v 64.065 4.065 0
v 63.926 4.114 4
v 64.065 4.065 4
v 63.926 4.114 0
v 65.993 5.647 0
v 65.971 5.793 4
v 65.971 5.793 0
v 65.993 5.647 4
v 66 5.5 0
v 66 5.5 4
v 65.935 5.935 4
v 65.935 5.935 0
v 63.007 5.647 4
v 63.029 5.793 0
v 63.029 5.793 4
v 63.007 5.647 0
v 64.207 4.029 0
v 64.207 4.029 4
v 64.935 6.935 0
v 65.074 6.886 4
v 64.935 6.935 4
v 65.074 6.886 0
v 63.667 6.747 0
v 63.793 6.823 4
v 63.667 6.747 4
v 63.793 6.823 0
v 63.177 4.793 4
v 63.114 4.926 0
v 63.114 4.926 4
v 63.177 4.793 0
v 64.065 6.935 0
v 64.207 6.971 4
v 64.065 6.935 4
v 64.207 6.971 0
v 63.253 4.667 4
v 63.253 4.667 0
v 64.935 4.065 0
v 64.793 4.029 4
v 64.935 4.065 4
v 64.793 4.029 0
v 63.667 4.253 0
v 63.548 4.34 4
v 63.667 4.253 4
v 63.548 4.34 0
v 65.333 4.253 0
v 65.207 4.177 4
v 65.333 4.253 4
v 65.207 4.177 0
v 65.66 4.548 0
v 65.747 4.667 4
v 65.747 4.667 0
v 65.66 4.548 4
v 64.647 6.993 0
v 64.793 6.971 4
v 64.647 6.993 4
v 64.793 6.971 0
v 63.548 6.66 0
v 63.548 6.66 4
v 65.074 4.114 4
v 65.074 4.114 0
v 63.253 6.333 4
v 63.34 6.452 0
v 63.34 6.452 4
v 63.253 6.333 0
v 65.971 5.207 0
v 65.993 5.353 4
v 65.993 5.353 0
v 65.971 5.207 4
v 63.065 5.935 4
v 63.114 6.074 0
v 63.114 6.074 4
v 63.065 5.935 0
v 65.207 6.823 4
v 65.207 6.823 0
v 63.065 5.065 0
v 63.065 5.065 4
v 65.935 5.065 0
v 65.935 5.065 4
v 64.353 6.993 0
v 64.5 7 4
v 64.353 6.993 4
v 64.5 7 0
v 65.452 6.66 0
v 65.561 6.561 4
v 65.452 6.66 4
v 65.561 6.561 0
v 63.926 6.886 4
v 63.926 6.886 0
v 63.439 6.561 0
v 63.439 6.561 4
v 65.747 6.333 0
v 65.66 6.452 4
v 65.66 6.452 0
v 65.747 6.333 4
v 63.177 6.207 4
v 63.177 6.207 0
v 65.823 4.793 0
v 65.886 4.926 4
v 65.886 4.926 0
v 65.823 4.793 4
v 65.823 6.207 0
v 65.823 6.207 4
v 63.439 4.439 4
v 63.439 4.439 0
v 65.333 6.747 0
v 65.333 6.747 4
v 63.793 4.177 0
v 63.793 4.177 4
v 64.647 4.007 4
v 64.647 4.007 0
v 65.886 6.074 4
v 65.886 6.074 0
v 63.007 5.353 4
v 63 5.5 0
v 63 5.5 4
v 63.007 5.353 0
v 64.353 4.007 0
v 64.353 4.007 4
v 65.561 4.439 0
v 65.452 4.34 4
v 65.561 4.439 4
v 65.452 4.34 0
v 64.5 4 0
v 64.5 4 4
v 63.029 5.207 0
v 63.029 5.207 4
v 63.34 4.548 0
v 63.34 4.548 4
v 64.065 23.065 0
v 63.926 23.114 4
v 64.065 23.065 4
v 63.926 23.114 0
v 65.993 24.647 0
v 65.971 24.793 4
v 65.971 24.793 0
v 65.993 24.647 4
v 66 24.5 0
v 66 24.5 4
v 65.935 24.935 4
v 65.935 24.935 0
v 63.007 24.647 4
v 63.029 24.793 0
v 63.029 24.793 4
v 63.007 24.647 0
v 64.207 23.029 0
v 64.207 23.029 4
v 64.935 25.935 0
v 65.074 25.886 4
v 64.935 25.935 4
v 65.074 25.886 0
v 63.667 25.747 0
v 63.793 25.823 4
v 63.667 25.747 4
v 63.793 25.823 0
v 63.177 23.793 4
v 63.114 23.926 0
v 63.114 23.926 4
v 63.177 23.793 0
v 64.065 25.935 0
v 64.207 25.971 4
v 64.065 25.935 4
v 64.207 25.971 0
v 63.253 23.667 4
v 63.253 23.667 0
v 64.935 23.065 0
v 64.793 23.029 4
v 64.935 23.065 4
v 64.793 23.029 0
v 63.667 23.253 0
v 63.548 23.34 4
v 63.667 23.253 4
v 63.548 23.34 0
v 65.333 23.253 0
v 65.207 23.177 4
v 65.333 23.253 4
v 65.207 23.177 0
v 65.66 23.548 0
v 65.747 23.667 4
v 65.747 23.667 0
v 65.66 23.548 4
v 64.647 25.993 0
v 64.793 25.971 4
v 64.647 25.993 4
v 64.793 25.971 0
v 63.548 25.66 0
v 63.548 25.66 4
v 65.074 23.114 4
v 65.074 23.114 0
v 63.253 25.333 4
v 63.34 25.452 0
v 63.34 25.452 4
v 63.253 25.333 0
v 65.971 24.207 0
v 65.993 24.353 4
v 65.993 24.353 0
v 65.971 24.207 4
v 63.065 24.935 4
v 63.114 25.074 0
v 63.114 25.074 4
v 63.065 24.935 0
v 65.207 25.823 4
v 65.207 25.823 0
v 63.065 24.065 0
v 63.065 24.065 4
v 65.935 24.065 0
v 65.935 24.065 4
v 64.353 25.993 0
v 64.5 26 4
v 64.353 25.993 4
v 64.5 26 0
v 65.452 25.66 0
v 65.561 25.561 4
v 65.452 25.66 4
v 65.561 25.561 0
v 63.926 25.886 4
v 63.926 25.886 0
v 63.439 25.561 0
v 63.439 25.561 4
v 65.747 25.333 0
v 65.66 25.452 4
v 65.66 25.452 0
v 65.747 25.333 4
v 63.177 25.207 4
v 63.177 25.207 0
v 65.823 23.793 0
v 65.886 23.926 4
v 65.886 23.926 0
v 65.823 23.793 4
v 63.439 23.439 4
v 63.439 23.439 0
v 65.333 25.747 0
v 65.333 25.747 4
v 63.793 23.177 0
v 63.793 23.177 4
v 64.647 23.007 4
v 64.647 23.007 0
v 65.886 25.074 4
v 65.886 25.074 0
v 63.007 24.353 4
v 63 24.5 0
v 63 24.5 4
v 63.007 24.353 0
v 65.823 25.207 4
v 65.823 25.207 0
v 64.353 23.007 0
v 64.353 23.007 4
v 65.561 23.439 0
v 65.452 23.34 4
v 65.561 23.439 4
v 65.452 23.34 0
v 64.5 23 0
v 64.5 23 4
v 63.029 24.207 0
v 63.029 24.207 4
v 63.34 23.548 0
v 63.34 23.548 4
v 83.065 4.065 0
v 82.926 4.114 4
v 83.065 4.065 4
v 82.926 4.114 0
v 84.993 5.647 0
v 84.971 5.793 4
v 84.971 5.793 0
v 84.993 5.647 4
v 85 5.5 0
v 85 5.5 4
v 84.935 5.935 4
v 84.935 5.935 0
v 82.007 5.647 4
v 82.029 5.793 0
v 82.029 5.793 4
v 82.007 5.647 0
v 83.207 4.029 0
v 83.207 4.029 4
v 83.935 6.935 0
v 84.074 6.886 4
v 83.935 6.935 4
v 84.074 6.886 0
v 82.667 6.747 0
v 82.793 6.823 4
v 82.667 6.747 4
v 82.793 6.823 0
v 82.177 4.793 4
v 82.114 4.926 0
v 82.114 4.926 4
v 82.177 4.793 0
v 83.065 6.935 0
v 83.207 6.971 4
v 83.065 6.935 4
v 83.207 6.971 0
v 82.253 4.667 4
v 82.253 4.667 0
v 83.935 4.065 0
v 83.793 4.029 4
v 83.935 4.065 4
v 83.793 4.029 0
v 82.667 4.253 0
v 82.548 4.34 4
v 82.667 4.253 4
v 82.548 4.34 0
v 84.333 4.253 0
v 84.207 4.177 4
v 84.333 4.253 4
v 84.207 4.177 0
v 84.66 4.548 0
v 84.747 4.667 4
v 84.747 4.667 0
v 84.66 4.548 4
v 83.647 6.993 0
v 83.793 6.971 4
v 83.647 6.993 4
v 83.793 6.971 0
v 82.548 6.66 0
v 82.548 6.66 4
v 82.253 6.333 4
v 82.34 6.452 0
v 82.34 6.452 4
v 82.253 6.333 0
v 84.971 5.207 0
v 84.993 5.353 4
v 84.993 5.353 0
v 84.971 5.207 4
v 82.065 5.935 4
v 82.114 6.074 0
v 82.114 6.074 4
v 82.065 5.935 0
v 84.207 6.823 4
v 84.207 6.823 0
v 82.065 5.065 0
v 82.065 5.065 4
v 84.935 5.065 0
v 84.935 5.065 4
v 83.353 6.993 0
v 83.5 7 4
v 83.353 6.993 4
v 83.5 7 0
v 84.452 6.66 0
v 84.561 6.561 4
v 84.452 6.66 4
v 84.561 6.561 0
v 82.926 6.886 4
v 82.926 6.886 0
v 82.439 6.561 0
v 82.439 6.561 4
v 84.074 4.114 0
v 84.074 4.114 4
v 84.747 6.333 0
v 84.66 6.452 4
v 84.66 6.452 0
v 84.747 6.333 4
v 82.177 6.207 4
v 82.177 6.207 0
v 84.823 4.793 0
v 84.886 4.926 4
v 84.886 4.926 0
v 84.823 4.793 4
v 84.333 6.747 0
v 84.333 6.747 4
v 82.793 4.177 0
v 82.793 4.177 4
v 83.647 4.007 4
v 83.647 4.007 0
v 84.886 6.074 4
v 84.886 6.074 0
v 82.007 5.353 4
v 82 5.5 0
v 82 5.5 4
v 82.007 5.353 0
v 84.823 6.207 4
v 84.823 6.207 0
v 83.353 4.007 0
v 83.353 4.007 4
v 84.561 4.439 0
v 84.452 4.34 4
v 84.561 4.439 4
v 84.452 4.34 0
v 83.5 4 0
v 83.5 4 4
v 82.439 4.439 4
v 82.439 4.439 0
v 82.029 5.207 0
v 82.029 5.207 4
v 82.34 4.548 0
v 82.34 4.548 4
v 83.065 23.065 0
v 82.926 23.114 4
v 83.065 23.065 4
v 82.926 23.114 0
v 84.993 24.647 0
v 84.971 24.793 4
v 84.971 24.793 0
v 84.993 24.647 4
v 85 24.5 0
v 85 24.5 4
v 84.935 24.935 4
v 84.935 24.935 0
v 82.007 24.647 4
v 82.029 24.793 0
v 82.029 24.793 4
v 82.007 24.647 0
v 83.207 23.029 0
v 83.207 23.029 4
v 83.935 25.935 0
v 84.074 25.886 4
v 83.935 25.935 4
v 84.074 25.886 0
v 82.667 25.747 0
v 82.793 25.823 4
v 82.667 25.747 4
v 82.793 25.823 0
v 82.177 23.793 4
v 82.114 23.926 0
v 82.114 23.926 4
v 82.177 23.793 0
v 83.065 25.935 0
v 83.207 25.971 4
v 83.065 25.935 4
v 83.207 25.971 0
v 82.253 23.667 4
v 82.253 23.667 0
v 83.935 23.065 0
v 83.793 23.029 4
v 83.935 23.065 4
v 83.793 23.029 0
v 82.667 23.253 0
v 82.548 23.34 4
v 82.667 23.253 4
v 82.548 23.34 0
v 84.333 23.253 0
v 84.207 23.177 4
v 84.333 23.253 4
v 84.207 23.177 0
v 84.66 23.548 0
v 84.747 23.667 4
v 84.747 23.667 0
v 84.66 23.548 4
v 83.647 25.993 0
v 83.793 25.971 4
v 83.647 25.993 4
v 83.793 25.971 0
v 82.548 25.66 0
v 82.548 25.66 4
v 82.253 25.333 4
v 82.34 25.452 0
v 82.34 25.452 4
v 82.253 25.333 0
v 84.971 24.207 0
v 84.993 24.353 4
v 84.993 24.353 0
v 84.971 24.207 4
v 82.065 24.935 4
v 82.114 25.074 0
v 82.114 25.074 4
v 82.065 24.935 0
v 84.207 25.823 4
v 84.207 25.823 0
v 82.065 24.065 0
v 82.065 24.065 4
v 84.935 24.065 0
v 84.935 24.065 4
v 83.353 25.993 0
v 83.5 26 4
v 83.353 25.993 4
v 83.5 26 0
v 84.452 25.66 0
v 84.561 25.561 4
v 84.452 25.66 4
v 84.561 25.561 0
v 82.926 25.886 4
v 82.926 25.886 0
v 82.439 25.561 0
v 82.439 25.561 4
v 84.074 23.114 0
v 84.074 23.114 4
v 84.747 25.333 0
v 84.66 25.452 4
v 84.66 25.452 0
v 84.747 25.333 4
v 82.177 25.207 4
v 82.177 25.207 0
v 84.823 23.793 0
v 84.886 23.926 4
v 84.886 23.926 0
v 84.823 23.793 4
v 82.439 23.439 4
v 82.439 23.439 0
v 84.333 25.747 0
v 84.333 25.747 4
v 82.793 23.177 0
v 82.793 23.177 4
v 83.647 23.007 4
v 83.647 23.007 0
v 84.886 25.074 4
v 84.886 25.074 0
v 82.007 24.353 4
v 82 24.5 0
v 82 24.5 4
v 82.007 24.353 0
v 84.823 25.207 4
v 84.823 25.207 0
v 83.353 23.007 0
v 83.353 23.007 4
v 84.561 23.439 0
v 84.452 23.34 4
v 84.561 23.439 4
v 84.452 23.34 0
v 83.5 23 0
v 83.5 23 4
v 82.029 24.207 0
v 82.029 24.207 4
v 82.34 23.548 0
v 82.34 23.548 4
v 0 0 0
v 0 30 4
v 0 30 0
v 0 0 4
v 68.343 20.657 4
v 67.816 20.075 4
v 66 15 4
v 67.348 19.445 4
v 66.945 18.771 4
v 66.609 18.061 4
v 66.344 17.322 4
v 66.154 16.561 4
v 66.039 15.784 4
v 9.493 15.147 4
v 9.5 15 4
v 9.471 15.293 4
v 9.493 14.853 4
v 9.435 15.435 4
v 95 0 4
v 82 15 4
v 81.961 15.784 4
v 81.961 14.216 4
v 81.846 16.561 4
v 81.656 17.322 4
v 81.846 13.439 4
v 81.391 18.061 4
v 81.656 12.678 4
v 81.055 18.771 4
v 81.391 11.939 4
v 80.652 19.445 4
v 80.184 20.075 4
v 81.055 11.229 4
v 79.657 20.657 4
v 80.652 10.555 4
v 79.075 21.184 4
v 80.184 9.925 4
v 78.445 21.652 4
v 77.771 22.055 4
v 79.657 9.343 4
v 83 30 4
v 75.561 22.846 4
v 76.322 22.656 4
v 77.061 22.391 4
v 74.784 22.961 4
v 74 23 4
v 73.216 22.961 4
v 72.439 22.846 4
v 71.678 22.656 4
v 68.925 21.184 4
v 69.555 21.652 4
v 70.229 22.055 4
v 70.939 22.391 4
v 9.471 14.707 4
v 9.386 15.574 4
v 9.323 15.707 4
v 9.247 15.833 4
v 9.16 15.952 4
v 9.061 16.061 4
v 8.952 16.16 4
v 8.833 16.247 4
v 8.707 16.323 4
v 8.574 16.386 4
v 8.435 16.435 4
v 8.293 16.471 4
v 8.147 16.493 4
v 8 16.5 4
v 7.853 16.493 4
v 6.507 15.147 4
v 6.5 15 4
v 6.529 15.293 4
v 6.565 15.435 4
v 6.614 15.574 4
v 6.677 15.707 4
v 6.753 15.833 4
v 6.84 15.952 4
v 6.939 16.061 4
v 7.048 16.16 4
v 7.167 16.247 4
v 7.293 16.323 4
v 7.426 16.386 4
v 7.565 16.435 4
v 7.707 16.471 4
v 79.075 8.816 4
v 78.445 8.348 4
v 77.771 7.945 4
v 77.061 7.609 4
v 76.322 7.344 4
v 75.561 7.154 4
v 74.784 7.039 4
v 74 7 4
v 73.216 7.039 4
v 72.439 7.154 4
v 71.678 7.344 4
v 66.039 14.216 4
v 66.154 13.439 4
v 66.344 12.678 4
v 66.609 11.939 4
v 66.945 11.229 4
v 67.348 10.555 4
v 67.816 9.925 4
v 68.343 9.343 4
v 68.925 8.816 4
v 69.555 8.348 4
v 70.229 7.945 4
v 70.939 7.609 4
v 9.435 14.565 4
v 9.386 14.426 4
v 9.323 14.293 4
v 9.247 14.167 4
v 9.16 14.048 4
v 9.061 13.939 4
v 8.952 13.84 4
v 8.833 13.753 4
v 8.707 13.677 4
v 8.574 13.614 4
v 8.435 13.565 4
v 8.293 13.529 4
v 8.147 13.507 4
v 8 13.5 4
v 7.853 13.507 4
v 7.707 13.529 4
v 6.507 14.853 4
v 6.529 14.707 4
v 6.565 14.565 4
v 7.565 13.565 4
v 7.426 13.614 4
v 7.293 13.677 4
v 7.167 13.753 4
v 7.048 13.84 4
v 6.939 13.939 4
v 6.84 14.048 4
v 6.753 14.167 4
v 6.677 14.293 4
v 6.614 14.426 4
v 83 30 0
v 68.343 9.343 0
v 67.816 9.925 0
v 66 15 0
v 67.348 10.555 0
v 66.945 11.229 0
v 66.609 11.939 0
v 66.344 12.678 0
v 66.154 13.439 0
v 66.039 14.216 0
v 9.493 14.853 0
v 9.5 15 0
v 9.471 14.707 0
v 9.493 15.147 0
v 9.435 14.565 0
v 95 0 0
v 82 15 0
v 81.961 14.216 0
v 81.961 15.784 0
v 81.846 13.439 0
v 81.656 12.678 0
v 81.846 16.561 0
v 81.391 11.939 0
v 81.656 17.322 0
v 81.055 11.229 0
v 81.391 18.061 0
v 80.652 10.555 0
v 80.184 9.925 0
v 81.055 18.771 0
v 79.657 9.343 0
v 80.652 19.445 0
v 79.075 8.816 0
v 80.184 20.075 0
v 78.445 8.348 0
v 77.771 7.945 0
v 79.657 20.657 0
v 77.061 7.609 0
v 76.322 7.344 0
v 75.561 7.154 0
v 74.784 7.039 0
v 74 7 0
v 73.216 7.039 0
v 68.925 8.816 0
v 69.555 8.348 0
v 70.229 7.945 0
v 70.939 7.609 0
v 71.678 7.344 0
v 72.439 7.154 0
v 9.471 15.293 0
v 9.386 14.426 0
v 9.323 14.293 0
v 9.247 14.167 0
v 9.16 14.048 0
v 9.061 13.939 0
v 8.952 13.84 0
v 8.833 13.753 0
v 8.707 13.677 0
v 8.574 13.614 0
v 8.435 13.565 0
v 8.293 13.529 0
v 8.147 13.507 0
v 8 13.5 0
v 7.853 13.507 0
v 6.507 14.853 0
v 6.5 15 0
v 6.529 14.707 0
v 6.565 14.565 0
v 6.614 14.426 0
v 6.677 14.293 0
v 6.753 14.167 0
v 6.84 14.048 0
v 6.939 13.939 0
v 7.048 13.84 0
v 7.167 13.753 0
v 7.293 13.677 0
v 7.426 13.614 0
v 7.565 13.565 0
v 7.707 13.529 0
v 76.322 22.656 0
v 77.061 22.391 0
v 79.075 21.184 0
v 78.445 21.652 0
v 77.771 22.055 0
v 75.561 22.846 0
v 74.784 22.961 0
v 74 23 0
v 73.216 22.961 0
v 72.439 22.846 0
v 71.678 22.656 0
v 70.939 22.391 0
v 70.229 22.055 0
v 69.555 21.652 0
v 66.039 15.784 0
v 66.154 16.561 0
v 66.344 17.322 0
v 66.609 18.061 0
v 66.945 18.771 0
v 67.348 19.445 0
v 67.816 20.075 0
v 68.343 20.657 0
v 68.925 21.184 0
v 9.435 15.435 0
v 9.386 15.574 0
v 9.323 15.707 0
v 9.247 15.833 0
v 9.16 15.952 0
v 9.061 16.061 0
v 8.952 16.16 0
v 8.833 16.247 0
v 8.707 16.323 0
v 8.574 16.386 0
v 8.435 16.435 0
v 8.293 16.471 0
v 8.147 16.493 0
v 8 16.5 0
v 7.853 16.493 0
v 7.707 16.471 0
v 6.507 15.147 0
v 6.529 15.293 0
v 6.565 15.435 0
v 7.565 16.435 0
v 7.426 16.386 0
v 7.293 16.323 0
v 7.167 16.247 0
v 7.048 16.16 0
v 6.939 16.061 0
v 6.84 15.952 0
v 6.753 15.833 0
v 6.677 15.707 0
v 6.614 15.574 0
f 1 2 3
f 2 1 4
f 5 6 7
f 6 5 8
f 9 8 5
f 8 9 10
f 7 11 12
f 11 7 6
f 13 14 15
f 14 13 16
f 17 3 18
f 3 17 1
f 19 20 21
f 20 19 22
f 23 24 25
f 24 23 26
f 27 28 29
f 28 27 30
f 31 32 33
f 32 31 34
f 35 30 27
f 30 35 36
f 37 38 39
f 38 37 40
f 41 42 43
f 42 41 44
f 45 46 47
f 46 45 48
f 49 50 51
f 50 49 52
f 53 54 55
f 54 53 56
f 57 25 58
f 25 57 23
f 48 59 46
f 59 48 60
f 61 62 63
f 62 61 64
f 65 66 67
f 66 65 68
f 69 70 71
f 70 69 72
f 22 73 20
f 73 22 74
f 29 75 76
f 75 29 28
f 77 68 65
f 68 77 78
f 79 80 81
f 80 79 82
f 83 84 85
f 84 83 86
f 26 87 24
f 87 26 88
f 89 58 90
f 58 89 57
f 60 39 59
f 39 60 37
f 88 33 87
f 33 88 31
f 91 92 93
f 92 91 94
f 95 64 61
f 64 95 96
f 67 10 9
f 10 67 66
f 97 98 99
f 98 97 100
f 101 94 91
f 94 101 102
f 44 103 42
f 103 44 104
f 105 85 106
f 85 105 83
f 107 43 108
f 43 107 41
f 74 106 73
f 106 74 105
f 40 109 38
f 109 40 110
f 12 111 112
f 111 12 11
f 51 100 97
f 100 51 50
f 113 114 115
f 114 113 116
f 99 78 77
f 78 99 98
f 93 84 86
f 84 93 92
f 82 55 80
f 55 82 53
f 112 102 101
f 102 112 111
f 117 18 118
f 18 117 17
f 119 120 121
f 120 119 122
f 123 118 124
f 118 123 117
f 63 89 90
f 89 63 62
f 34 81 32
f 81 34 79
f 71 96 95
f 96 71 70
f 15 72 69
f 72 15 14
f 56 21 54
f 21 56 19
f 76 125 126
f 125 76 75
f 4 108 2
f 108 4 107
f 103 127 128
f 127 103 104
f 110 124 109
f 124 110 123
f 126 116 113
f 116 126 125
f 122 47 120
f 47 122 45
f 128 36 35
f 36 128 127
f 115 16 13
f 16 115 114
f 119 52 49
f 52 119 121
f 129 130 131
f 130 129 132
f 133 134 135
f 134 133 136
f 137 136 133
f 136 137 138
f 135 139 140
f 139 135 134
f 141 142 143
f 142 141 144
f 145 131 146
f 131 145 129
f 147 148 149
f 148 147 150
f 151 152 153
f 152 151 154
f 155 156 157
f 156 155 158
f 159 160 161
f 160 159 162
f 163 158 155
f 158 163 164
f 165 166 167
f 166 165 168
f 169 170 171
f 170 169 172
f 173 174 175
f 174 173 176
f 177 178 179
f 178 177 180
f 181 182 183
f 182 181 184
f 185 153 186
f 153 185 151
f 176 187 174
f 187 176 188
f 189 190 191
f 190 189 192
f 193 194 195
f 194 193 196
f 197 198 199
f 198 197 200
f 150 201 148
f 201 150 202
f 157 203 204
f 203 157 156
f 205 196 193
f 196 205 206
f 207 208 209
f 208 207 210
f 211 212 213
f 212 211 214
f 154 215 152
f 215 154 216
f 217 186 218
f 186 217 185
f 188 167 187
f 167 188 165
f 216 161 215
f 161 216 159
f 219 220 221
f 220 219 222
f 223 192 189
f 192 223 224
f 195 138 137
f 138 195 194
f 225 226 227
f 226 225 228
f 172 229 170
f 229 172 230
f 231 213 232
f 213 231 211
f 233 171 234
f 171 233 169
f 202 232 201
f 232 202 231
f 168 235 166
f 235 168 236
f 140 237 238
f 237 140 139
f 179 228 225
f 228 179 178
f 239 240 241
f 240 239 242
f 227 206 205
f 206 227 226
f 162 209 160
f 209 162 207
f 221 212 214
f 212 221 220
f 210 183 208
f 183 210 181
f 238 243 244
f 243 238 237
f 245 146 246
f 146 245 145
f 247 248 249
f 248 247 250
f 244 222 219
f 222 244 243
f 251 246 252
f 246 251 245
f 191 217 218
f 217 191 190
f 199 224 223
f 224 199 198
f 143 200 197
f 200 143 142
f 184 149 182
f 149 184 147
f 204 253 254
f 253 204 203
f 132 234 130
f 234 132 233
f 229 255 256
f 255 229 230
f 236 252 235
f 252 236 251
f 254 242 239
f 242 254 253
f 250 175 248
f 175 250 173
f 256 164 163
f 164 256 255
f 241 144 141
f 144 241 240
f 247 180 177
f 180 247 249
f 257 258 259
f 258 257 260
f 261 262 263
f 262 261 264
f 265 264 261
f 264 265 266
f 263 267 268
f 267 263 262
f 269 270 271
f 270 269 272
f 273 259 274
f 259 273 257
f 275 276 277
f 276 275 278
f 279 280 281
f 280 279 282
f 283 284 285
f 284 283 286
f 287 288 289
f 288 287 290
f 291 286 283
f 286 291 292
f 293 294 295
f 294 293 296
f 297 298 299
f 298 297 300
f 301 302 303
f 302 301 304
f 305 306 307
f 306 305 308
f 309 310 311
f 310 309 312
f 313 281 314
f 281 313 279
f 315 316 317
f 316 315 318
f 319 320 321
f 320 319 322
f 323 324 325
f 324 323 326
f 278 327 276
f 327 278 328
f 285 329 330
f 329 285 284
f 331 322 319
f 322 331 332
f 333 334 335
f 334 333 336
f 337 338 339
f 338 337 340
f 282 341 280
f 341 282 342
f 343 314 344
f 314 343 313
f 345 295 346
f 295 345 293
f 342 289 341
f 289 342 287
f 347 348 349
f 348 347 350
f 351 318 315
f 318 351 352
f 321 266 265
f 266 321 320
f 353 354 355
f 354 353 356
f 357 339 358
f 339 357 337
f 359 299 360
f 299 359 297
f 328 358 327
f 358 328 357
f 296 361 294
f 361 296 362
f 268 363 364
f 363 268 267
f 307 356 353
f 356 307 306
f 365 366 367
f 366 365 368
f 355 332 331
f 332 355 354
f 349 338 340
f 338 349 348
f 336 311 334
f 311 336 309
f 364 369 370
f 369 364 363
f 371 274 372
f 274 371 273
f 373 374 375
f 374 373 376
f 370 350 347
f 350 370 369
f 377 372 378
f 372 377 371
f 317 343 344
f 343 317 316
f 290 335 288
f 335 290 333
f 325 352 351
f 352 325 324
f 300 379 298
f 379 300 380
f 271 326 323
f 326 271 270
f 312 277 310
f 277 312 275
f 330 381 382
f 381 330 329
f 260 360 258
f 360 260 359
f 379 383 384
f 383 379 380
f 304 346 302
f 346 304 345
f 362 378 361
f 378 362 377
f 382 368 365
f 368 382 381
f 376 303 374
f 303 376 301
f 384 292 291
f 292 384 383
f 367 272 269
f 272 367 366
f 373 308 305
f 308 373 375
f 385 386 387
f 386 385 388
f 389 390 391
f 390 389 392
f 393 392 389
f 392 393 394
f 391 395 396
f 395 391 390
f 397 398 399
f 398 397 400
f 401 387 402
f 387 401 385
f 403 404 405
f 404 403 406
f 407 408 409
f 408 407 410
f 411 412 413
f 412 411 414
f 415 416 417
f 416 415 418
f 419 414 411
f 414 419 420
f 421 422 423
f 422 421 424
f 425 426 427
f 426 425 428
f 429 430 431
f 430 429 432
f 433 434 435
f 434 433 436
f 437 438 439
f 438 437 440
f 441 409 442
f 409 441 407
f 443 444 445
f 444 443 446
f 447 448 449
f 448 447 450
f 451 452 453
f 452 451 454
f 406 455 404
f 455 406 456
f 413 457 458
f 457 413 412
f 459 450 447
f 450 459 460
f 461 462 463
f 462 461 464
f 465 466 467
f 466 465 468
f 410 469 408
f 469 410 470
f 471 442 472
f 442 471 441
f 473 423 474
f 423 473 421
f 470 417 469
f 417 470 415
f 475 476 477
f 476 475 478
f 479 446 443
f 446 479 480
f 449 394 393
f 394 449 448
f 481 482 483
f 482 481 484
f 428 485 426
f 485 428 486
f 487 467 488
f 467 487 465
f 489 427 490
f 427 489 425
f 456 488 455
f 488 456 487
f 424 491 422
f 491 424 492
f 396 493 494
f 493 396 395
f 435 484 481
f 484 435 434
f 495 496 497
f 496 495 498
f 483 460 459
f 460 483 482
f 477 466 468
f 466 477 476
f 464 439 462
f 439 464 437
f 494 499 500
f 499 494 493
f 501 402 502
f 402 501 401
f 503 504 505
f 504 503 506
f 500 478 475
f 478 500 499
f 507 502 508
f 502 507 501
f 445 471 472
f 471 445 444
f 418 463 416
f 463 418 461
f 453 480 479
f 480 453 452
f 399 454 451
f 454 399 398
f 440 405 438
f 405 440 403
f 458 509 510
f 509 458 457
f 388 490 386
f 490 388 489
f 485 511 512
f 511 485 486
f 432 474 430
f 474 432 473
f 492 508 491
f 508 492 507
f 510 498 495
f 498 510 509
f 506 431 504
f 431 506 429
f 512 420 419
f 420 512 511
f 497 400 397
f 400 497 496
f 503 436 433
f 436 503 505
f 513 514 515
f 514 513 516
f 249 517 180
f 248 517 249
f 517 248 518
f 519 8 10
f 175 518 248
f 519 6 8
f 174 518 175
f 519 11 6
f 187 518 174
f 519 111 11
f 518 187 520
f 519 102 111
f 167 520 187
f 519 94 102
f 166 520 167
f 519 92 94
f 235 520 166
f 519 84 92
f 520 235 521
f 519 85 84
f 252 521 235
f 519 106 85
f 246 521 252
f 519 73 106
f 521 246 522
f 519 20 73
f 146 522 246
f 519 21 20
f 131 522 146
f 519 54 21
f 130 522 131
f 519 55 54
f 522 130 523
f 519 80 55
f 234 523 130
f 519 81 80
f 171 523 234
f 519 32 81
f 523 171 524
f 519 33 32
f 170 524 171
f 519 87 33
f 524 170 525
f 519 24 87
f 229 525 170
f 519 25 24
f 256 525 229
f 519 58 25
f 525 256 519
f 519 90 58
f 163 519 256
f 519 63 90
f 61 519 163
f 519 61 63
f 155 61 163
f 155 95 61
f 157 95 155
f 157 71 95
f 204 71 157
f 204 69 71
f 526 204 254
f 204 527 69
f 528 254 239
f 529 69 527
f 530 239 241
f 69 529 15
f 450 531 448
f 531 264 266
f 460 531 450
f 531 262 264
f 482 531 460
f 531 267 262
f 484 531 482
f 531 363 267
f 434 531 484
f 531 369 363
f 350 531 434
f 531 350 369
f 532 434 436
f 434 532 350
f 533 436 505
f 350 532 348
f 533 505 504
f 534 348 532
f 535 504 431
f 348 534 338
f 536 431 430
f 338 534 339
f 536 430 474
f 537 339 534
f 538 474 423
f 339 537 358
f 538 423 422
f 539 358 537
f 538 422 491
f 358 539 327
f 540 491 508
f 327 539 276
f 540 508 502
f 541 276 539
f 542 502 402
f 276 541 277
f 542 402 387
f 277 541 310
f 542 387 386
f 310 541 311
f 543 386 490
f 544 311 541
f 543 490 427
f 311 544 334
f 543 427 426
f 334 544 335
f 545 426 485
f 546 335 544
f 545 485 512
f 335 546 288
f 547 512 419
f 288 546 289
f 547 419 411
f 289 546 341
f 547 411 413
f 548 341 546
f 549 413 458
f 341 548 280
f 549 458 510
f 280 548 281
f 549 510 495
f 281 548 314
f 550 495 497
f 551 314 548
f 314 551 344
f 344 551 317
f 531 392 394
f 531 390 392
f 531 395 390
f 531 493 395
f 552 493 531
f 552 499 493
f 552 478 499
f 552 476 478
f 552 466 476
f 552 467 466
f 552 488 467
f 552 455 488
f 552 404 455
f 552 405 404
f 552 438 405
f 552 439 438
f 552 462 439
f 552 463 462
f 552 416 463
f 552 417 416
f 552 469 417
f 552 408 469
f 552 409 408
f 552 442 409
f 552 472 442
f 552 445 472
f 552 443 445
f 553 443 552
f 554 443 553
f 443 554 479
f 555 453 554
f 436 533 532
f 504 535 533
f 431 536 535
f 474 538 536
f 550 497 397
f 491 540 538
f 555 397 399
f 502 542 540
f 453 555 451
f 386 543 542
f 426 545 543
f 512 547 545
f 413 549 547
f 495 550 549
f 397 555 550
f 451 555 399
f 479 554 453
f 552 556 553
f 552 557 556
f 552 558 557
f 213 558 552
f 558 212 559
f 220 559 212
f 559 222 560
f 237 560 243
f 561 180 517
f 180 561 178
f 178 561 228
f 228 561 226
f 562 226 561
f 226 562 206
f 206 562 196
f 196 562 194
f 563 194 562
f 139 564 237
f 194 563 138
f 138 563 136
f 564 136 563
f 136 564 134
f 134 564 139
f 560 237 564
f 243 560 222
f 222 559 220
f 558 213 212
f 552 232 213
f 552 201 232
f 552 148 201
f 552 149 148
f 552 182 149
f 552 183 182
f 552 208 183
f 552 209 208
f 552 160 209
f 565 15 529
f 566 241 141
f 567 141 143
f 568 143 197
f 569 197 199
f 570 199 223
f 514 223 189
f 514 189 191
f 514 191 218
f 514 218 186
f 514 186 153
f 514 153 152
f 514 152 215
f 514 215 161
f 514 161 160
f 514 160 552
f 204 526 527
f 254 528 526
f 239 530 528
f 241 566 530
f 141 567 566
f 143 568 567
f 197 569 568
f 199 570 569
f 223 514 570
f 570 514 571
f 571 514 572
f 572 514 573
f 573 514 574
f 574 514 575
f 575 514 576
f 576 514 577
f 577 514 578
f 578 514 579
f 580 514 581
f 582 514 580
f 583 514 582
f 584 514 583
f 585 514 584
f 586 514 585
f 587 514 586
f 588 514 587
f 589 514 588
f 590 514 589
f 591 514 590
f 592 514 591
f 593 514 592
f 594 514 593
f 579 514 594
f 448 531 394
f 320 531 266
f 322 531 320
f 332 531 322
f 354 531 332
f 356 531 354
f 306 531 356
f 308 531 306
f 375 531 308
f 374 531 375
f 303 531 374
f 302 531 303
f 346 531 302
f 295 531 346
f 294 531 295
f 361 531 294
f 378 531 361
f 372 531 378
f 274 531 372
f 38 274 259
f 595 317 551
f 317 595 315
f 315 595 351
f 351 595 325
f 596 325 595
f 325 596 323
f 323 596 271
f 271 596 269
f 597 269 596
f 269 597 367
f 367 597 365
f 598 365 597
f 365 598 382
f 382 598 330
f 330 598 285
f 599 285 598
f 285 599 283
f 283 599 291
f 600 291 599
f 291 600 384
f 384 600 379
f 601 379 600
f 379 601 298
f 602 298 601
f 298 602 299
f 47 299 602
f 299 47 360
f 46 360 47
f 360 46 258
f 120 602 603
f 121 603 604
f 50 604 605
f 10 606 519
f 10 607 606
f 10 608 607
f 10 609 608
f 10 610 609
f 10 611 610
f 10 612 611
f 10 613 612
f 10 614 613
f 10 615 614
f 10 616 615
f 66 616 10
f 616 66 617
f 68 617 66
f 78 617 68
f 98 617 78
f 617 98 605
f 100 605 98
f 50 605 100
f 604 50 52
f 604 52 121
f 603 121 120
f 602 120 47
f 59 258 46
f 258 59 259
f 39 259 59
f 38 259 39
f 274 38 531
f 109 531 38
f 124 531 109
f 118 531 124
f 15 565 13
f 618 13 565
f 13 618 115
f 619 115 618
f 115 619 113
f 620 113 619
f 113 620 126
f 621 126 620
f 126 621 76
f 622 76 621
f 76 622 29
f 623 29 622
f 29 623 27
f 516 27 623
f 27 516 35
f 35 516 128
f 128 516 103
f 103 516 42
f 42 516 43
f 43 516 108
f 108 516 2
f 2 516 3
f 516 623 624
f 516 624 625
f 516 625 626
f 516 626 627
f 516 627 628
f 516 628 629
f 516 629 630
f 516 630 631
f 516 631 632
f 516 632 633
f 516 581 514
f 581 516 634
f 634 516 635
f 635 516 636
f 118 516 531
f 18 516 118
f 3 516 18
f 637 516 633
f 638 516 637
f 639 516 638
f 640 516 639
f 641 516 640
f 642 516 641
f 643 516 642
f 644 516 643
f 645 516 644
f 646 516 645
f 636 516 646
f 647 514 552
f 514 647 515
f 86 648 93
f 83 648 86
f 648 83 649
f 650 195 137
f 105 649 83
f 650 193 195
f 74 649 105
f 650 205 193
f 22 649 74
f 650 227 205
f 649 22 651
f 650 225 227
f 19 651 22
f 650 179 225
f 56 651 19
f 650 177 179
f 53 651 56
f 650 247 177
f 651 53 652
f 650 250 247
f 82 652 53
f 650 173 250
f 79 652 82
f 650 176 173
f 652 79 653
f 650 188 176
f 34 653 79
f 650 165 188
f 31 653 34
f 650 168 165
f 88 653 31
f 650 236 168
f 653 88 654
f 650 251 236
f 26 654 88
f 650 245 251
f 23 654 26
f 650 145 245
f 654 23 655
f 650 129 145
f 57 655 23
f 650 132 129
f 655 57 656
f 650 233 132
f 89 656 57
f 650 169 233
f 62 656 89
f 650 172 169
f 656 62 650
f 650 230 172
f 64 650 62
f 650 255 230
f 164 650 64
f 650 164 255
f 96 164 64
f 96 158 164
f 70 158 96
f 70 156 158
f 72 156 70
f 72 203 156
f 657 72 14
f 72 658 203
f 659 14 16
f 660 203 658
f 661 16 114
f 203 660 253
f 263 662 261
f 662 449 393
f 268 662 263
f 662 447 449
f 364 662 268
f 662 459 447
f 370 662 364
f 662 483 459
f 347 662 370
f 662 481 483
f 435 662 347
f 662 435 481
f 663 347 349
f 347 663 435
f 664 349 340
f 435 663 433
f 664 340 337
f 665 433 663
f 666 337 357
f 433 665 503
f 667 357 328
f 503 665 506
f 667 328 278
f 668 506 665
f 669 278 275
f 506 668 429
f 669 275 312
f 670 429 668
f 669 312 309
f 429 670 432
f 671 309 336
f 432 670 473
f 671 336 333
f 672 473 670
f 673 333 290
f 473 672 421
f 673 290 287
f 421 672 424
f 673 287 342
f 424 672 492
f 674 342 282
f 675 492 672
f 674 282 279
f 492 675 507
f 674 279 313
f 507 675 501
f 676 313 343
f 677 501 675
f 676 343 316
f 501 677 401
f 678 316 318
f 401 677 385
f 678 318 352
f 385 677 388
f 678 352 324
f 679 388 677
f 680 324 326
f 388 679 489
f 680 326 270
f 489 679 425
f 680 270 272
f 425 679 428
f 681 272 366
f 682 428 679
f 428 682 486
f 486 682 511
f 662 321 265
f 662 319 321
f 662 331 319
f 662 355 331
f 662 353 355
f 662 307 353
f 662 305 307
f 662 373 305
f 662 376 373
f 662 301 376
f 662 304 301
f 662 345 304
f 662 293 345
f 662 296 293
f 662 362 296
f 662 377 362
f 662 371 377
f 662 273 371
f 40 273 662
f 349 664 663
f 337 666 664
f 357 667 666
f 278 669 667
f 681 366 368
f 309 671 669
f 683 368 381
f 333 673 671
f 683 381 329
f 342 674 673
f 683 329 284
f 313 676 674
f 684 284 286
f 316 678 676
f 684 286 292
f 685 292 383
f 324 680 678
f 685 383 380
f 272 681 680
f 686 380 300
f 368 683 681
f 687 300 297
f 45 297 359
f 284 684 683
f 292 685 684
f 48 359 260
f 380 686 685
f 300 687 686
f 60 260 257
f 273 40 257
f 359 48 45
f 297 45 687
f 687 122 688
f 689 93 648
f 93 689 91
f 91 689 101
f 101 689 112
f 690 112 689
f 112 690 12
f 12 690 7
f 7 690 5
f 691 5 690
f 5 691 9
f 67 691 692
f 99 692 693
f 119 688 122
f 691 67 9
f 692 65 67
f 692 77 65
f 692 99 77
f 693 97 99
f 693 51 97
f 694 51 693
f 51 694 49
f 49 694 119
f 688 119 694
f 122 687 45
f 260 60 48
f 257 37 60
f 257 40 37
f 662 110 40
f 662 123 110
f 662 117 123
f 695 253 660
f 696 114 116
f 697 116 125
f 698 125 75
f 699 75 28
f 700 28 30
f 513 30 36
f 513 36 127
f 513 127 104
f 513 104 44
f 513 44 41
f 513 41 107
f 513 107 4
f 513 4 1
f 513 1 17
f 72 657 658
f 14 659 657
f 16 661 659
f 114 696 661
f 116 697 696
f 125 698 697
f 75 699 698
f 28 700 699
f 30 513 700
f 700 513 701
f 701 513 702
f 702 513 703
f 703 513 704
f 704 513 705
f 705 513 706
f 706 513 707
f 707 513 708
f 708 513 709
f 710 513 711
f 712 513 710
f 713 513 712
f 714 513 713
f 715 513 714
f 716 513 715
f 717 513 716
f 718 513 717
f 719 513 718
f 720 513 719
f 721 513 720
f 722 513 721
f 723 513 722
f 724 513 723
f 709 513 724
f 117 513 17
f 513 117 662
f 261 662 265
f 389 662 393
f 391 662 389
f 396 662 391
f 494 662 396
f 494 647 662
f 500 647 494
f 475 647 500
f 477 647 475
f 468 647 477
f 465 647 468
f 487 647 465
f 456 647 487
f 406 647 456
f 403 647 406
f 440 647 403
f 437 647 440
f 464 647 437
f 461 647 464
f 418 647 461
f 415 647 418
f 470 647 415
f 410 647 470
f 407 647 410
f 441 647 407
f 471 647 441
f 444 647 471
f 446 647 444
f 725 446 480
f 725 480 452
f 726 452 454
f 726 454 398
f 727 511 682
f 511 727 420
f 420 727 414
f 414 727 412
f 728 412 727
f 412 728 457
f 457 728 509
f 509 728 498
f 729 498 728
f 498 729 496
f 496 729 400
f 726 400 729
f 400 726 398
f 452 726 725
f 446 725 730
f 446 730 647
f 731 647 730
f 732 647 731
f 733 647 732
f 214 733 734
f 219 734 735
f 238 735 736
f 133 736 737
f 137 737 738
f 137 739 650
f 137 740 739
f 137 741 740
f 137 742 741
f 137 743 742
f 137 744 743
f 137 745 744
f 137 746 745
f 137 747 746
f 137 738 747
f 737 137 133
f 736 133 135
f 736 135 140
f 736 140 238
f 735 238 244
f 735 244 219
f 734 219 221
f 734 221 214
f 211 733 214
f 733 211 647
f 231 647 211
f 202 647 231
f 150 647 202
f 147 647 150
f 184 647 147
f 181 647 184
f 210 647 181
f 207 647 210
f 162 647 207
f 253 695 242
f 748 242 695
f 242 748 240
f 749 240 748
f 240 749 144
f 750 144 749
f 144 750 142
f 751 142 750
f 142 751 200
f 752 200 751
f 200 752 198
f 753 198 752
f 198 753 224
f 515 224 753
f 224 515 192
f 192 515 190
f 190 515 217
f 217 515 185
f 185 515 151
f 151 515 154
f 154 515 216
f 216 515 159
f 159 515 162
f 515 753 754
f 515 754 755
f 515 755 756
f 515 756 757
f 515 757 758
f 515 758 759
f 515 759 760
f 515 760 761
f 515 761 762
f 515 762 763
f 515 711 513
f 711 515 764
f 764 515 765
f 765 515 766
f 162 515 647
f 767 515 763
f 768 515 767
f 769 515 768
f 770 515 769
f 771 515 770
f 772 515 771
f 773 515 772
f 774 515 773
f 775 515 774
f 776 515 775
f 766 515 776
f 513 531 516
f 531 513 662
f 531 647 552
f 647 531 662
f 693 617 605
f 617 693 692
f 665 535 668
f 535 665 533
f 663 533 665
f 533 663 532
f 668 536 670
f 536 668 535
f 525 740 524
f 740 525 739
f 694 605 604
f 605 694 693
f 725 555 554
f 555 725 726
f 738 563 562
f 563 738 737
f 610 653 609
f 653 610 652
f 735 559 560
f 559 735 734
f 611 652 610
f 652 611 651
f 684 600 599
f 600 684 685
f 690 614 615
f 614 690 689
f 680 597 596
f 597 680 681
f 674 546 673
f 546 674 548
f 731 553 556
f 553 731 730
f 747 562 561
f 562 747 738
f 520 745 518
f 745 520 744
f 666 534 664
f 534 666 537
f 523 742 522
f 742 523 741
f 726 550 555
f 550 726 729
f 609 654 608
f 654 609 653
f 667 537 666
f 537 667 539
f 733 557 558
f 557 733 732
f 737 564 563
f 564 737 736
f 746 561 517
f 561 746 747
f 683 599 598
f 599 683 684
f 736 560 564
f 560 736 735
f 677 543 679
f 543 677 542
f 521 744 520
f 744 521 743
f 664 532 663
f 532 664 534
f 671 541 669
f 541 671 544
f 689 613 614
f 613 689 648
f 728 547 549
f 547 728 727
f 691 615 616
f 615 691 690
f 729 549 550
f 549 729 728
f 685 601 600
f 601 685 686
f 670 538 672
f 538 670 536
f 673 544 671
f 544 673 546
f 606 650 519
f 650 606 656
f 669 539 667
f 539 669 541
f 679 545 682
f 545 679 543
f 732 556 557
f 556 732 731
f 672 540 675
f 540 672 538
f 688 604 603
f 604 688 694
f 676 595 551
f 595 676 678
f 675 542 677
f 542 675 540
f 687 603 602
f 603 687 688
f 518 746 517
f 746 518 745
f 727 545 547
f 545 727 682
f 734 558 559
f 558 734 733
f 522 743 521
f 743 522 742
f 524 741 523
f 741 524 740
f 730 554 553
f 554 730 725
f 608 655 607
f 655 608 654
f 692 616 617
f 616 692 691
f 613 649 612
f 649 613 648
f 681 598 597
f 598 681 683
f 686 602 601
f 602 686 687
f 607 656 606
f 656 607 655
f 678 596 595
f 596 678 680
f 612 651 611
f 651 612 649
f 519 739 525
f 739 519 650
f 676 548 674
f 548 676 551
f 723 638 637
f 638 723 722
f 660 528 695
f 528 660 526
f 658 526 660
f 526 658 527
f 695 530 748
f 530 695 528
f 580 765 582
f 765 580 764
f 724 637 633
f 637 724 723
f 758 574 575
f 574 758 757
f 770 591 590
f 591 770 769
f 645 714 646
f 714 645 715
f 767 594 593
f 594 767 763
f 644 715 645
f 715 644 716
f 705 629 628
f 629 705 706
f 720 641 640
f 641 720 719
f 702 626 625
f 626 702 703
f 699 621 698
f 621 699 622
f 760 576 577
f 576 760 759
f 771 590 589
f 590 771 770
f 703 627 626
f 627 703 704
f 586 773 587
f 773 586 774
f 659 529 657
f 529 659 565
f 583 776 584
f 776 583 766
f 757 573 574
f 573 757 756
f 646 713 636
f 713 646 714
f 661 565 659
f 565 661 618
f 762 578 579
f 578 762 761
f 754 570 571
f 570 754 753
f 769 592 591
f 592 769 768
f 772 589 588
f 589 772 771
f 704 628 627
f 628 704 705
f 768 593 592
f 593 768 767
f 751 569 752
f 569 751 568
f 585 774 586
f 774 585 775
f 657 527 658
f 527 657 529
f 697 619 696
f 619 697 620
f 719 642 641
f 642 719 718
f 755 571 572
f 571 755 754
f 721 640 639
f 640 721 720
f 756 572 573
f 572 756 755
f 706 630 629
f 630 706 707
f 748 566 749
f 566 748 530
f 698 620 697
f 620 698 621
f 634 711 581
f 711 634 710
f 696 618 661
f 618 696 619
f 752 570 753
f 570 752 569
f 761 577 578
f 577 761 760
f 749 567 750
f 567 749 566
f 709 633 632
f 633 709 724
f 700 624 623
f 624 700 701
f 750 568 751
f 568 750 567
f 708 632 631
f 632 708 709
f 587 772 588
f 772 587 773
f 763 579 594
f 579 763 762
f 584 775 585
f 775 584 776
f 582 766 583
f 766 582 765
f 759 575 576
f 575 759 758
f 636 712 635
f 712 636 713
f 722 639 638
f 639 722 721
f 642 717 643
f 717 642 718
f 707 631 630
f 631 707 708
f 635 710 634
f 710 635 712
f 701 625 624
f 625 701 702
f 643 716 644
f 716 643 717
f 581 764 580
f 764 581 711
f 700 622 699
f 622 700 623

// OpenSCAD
// QAV-250 Arm — single arm, 2207 motor, 5" prop clearance
// Print: PA6-CF 0.16mm (highest strength, resists prop impacts)
// 4 arms needed for each drone (×3 drones = 12 arms total)
// Print time: ~30 min per arm in PA6-CF

/* [Arm Geometry] */
ARM_LEN = 95;             // mm total length
ARM_WIDTH_BASE = 30;      // mm wide at frame
ARM_WIDTH_TIP = 18;       // mm wide at motor mount
ARM_THICK_BASE = 5;       // mm thicker at the base
ARM_THICK_TIP = 4;        // mm at the tip
ARM_VERTICAL_THICK = 4;
ARM_MOTOR_HOLE_DIA = 16;  // mm center motor mount
ARM_MOTOR_HOLE_SPACING = 19; // mm between motor screws
ARM_HOLE_DIA = 3;         // mm M3 mounting

$fn = 64;

// Single arm drawn flat as a tapered plate
module arm_flat() {
    hull() {
        cube([ARM_LEN, ARM_WIDTH_BASE, ARM_THICK_BASE]);
        translate([ARM_LEN, 0, 0]) 
            cube([1, ARM_WIDTH_TIP, ARM_THICK_TIP]); // placeholder for taper
    }
}

// Better: defined geometry with proper taper
module arm_proper() {
    linear_extrude(height=ARM_VERTICAL_THICK) {
        polygon(points=[
            [0, 0],
            [ARM_LEN, 0],
            [ARM_LEN + ARM_WIDTH_TIP - ARM_WIDTH_BASE, ARM_WIDTH_BASE],
            [0, ARM_WIDTH_BASE],
        ]);
    }
}

difference() {
    arm_proper();
    
    // Motor mount holes
    translate([ARM_LEN + ARM_WIDTH_TIP/2 - ARM_WIDTH_BASE, ARM_WIDTH_BASE/2, -1])
        cylinder(h=ARM_VERTICAL_THICK+2, d=ARM_MOTOR_HOLE_DIA);
    
    // 4× M3 motor mount screws around center
    for (dx = [-1, 1], dy = [-1, 1]) {
        translate([
            ARM_LEN + ARM_WIDTH_TIP/2 - ARM_WIDTH_BASE + dx * ARM_MOTOR_HOLE_SPACING/2,
            ARM_WIDTH_BASE/2 + dy * ARM_MOTOR_HOLE_SPACING/2,
            -1
        ])
            cylinder(h=ARM_VERTICAL_THICK+2, d=ARM_HOLE_DIA);
    }
    
    // Mount hole on the frame end
    translate([8, ARM_WIDTH_BASE/2, -1])
        cylinder(h=ARM_VERTICAL_THICK+2, d=ARM_HOLE_DIA);
}
